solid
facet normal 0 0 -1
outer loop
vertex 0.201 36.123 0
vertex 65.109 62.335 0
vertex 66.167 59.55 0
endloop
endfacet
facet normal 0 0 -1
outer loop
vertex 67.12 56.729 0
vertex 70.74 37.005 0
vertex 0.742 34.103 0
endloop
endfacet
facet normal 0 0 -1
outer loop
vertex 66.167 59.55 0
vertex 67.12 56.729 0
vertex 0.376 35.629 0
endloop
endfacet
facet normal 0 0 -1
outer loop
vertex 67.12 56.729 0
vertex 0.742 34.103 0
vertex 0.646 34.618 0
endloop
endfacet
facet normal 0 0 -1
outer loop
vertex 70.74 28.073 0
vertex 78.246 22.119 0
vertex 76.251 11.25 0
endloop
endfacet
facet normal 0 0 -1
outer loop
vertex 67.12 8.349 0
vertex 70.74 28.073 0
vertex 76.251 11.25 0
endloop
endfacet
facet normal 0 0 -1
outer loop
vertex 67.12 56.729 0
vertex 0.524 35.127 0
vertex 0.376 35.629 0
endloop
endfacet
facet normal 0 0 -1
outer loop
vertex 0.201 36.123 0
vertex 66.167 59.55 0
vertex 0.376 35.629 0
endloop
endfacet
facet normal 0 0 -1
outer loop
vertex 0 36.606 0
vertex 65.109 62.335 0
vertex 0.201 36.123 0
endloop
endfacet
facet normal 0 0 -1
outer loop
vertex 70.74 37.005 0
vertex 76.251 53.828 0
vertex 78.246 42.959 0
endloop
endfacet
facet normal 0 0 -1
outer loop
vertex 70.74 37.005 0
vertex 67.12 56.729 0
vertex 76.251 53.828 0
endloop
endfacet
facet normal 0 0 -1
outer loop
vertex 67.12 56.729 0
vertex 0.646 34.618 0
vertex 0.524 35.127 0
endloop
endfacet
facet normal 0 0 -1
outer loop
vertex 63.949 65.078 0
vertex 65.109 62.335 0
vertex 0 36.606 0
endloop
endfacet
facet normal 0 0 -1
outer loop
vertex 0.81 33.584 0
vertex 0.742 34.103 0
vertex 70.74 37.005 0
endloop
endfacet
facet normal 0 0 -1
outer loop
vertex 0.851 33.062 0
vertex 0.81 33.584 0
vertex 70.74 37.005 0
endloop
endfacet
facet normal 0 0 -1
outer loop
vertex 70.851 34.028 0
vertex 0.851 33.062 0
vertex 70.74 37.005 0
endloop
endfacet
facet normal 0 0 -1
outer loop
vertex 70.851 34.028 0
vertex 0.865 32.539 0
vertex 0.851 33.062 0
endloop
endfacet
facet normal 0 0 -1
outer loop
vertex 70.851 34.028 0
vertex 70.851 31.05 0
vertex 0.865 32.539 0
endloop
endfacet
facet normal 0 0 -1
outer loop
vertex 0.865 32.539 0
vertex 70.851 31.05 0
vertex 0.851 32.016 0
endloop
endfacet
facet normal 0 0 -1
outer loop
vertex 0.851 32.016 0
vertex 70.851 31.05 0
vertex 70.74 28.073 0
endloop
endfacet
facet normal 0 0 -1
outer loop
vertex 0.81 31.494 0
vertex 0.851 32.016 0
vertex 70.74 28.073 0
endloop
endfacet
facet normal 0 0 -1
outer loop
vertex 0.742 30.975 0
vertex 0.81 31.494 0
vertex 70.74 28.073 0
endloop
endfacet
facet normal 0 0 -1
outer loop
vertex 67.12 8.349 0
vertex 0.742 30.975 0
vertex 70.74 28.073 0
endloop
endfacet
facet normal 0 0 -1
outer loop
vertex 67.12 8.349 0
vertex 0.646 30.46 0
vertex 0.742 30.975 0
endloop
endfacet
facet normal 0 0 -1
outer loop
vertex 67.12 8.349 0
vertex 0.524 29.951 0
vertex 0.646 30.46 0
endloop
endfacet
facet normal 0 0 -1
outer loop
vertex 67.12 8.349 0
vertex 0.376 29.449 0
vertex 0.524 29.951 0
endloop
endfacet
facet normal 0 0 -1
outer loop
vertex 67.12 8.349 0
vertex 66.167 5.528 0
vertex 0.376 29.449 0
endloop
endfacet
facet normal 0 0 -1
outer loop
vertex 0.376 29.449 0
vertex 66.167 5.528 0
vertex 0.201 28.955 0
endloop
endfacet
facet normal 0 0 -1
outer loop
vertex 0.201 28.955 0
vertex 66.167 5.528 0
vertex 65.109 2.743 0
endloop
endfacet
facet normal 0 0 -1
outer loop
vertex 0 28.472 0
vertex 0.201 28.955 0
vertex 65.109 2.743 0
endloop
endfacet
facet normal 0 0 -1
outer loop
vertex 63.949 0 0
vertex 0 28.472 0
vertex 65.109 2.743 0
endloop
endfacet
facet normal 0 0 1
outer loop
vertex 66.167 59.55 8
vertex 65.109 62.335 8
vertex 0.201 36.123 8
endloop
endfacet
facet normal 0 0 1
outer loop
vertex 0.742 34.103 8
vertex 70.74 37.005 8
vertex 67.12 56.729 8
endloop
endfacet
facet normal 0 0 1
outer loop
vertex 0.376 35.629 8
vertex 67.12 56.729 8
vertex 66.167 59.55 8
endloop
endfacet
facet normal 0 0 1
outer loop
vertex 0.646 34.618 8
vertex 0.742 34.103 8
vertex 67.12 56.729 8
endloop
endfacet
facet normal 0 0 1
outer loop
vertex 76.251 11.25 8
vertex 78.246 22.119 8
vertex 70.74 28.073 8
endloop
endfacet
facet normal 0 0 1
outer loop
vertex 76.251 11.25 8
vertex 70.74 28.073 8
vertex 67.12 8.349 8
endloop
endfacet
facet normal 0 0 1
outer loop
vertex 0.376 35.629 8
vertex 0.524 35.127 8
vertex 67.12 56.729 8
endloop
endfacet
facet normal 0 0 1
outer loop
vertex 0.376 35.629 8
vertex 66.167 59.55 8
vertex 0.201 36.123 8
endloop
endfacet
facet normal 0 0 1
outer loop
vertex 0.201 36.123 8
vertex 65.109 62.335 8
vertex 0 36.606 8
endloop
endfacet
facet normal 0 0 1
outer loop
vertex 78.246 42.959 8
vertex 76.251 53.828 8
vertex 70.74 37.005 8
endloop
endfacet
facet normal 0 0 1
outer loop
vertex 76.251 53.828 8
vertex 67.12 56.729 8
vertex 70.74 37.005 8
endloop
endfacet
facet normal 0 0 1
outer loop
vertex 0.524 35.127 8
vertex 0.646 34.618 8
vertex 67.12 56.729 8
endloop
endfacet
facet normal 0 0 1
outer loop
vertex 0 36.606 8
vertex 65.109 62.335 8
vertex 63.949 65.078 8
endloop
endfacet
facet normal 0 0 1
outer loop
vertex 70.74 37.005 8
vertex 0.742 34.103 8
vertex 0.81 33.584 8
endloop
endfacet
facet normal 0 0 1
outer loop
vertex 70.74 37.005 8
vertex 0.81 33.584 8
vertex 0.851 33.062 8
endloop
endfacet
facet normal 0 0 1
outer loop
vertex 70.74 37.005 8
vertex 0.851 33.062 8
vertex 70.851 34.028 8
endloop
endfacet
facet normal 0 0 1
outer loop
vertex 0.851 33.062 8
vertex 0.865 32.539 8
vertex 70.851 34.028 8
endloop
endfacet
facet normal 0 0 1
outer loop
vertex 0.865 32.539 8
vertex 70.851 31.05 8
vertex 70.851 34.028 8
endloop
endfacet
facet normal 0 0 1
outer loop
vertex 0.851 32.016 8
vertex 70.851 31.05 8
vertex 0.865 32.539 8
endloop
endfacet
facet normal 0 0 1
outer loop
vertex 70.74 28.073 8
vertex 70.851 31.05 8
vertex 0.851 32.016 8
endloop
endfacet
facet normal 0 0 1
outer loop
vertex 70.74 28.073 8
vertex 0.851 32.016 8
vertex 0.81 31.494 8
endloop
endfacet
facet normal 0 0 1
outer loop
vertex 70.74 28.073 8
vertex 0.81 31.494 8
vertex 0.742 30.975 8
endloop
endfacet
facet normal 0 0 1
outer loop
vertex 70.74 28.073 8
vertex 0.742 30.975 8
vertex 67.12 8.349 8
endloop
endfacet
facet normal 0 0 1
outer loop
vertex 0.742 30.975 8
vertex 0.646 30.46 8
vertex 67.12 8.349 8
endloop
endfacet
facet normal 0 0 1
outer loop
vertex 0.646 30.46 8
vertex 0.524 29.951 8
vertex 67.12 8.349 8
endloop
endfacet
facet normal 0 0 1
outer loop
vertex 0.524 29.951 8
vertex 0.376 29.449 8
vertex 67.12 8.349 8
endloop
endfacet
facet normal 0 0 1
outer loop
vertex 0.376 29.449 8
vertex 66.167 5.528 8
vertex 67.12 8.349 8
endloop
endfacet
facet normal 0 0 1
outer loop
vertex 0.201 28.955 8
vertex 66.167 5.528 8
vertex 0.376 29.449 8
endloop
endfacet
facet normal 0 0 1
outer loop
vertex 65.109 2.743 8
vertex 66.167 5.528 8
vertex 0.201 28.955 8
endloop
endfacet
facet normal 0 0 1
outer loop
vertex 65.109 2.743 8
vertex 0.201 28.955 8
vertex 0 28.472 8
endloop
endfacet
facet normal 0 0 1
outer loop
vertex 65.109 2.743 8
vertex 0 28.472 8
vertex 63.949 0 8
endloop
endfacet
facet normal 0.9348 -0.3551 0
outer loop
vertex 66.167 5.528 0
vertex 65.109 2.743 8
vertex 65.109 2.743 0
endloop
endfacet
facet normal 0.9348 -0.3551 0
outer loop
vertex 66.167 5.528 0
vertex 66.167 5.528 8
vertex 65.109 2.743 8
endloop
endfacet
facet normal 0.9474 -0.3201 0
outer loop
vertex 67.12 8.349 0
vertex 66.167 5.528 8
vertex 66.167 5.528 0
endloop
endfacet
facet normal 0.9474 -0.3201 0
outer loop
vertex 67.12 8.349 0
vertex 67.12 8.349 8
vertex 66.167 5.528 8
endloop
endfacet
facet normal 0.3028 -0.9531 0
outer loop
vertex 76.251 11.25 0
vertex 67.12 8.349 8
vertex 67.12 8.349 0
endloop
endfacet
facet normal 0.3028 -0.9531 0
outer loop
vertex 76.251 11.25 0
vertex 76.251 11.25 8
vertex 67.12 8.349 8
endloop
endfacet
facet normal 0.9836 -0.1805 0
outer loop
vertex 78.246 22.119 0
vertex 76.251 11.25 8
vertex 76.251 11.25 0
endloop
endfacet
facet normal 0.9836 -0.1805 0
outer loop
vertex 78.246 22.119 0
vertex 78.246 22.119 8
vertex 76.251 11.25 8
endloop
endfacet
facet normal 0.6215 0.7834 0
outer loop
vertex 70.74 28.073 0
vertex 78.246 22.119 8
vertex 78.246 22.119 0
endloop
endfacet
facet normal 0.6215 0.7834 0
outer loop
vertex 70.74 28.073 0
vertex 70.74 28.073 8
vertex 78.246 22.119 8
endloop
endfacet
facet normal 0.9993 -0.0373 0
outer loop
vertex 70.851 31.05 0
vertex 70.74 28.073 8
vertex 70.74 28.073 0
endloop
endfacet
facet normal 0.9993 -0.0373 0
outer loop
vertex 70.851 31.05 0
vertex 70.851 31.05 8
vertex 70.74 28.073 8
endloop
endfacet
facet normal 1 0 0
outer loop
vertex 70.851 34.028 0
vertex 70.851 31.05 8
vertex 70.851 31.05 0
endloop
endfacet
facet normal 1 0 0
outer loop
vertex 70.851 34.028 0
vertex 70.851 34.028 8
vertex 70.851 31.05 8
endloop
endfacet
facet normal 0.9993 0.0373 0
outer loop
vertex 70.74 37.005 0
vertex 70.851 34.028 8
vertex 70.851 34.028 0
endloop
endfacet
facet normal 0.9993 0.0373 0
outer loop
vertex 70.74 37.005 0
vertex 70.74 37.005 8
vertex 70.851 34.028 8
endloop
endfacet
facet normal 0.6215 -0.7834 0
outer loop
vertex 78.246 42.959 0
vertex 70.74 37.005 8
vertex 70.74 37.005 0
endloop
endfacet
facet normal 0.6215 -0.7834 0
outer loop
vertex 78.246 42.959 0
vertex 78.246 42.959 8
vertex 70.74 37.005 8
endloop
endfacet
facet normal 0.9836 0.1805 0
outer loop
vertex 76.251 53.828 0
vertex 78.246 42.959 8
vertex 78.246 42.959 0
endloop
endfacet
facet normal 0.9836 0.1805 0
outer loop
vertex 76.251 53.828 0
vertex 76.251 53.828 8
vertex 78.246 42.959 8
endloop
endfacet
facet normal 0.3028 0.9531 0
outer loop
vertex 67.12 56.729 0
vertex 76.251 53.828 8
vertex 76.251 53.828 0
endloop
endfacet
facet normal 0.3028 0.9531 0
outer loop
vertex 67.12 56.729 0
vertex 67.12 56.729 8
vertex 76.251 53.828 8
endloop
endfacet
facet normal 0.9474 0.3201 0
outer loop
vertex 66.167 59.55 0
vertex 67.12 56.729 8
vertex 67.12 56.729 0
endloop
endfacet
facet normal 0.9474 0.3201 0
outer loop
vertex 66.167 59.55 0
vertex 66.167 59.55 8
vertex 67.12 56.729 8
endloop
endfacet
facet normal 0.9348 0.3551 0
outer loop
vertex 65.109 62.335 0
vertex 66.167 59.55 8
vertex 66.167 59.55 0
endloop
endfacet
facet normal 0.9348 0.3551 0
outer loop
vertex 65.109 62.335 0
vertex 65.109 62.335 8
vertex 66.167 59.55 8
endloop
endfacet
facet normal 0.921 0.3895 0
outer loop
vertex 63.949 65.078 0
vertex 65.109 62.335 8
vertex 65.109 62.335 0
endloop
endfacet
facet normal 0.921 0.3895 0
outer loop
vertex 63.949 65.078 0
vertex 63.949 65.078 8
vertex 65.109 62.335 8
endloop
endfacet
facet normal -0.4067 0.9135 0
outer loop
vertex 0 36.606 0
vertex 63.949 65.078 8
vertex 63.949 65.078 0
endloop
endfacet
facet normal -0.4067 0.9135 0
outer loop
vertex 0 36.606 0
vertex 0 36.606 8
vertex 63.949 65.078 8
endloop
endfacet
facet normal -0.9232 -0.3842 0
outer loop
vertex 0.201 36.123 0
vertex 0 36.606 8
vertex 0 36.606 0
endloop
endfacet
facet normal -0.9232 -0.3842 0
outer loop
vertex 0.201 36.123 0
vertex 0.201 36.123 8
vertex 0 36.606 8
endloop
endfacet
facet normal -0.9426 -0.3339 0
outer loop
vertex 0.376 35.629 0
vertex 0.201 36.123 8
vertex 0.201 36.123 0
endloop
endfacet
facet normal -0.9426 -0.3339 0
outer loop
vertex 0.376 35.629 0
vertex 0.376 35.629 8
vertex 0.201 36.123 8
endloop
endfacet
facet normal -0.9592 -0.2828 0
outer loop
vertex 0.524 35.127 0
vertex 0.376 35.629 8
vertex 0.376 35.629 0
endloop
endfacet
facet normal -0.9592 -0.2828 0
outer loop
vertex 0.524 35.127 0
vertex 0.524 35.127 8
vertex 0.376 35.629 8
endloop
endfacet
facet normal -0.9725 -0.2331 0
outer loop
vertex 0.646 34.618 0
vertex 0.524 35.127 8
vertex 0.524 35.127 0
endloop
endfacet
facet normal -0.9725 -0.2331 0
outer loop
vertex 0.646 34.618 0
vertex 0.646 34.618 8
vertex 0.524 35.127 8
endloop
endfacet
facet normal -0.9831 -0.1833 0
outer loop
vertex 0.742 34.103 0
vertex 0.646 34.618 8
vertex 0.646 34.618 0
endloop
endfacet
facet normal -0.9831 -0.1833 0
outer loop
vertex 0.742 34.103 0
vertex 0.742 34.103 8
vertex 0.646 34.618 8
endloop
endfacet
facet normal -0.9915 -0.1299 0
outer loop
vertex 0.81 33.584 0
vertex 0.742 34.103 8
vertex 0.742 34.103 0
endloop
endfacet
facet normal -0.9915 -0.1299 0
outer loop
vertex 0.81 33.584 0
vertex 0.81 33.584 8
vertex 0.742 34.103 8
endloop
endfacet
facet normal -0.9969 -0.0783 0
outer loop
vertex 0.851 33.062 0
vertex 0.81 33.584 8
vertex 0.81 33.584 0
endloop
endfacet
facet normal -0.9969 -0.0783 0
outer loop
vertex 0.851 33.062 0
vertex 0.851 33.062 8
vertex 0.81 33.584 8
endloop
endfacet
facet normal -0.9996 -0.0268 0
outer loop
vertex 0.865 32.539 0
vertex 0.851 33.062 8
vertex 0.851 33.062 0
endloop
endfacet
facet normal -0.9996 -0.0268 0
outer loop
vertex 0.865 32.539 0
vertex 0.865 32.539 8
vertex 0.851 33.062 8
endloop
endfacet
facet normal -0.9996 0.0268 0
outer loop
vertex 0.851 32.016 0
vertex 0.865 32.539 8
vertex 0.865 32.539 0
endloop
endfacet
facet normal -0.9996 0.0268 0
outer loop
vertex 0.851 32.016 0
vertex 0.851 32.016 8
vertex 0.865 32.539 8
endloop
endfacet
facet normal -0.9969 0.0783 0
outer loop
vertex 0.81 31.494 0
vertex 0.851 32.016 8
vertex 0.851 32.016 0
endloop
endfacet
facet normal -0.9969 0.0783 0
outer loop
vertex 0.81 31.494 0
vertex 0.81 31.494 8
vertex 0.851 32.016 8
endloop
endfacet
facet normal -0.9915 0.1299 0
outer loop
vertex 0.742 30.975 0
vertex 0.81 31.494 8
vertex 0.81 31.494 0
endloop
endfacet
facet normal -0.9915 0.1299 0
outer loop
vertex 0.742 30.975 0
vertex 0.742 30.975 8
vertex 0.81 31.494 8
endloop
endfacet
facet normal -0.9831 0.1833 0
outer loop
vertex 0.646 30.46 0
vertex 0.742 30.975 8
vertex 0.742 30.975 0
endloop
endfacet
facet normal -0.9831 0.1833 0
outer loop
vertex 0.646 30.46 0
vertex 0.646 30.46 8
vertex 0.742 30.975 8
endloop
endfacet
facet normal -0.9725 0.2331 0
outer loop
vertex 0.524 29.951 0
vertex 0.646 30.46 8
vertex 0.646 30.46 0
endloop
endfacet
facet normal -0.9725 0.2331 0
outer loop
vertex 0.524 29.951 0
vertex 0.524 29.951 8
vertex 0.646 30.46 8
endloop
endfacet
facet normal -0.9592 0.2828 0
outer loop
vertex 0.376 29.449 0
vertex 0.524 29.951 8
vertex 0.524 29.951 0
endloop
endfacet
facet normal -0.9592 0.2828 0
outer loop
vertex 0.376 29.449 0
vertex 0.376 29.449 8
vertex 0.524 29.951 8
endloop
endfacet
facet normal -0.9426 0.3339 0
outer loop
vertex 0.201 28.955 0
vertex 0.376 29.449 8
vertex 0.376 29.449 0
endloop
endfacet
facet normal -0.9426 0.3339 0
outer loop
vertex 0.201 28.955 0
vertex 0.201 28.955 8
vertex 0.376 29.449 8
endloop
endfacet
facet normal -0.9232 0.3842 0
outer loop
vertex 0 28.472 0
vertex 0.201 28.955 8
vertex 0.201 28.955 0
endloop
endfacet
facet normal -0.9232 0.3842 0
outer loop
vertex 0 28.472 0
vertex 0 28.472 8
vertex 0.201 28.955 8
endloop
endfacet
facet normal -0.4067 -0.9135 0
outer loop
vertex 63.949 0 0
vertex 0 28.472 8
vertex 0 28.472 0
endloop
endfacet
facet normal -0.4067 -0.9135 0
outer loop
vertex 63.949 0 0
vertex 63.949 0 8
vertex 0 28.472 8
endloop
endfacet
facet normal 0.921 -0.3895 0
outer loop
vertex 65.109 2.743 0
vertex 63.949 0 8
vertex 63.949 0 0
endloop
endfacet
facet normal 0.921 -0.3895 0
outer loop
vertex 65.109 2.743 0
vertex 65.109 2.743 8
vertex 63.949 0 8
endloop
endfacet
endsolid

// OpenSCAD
$fn = 32;

// ----------------------------------------------------------------------
// Gear sector: 2 teeth on 48 degrees
// ----------------------------------------------------------------------

// --- parameters (mm) ---
sector_angle = 48;        // sector angle, degrees
root_r = 80;              // root circle radius
tooth_h = 8;              // tooth height over the root circle
teeth = 2;                // number of teeth on the sector
hub_r = 10;               // hub bore radius
plate_t = 8;              // sector thickness, Z
arc_step = 3;             // sampling step of the root/hub arcs, degrees

tip_r = root_r + tooth_h;  // tip circle radius

profile = [[63.949, 0], [65.109, 2.743], [66.167, 5.528], [67.12, 8.349], [76.251, 11.25], [78.246, 22.119], [70.74, 28.073], [70.851, 31.05], [70.851, 34.028], [70.74, 37.005], [78.246, 42.959], [76.251, 53.828], [67.12, 56.729], [66.167, 59.55], [65.109, 62.335], [63.949, 65.078], [0, 36.606], [0.201, 36.123], [0.376, 35.629], [0.524, 35.127], [0.646, 34.618], [0.742, 34.103], [0.81, 33.584], [0.851, 33.062], [0.865, 32.539], [0.851, 32.016], [0.81, 31.494], [0.742, 30.975], [0.646, 30.46], [0.524, 29.951], [0.376, 29.449], [0.201, 28.955], [0, 28.472]];  // primary outline, 33 points, counter clockwise

// --- the one profile operation ---
linear_extrude(height = plate_t) polygon(points = profile);
